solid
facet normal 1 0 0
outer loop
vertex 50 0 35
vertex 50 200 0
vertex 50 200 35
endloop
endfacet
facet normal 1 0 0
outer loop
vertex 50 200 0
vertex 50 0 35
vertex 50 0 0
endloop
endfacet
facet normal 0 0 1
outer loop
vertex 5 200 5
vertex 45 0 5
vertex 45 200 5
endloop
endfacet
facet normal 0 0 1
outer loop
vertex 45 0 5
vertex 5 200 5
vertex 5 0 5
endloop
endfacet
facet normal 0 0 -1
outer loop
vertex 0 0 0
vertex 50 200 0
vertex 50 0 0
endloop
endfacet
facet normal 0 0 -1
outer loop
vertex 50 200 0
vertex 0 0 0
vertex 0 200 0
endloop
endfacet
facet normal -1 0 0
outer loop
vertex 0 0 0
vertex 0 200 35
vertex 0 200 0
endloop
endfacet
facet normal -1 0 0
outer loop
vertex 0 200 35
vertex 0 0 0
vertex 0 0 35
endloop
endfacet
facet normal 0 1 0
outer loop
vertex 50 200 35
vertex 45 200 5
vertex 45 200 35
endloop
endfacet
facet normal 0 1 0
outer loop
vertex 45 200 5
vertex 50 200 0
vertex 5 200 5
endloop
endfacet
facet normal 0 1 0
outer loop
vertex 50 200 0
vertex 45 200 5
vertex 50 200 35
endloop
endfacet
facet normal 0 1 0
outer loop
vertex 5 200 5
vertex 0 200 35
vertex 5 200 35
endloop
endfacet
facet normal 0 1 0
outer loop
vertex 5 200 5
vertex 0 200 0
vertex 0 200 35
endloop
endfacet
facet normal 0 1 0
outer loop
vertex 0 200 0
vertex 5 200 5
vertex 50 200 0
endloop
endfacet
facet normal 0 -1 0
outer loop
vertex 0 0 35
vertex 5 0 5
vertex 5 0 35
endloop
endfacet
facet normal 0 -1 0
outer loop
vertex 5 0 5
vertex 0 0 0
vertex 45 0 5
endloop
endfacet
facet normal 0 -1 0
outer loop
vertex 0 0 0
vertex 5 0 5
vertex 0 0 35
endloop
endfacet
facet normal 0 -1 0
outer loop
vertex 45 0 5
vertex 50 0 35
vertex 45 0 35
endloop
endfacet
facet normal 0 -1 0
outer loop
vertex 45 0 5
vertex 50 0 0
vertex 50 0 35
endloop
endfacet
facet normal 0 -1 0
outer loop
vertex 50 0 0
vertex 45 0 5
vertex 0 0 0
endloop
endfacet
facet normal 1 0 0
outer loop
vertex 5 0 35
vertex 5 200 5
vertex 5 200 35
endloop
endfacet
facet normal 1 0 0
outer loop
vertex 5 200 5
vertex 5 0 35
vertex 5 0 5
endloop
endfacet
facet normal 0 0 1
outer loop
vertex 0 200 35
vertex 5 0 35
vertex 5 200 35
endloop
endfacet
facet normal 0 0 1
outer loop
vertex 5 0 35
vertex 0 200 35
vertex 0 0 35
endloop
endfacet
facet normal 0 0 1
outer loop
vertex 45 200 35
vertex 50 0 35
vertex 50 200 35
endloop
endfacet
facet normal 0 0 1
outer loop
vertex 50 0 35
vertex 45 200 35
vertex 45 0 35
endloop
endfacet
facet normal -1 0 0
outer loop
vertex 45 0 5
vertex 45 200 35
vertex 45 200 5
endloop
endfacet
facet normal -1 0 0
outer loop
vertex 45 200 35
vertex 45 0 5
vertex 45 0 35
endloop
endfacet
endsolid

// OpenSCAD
// Beam parameters
beam_length = 200; // Length of the channel beam (along Y-axis)
web_width = 50;    // Width of the horizontal web section (along X-axis)
flange_height = 30; // Height of the vertical flange sections (along Z-axis, above the web)
material_thickness = 5; // Thickness of the material for web and flanges

// Color for the beam
beam_color = [0.6, 0.6, 0.6, 1.0]; // A light grey color

module channel_beam() {
    color(beam_color) {
        union() {
            // Horizontal Web (lying on the ground)
            // Dimensions: [web_width, beam_length, material_thickness]
            // Position: Starts at [0, 0, 0]
            cube([web_width, beam_length, material_thickness]);

            // Left Vertical Flange
            // Dimensions: [material_thickness, beam_length, flange_height]
            // Position: Starts at [0, 0, material_thickness]
            translate([0, 0, material_thickness])
                cube([material_thickness, beam_length, flange_height]);

            // Right Vertical Flange
            // Dimensions: [material_thickness, beam_length, flange_height]
            // Position: Starts at [web_width - material_thickness, 0, material_thickness]
            translate([web_width - material_thickness, 0, material_thickness])
                cube([material_thickness, beam_length, flange_height]);
        }
    }
}

channel_beam();
